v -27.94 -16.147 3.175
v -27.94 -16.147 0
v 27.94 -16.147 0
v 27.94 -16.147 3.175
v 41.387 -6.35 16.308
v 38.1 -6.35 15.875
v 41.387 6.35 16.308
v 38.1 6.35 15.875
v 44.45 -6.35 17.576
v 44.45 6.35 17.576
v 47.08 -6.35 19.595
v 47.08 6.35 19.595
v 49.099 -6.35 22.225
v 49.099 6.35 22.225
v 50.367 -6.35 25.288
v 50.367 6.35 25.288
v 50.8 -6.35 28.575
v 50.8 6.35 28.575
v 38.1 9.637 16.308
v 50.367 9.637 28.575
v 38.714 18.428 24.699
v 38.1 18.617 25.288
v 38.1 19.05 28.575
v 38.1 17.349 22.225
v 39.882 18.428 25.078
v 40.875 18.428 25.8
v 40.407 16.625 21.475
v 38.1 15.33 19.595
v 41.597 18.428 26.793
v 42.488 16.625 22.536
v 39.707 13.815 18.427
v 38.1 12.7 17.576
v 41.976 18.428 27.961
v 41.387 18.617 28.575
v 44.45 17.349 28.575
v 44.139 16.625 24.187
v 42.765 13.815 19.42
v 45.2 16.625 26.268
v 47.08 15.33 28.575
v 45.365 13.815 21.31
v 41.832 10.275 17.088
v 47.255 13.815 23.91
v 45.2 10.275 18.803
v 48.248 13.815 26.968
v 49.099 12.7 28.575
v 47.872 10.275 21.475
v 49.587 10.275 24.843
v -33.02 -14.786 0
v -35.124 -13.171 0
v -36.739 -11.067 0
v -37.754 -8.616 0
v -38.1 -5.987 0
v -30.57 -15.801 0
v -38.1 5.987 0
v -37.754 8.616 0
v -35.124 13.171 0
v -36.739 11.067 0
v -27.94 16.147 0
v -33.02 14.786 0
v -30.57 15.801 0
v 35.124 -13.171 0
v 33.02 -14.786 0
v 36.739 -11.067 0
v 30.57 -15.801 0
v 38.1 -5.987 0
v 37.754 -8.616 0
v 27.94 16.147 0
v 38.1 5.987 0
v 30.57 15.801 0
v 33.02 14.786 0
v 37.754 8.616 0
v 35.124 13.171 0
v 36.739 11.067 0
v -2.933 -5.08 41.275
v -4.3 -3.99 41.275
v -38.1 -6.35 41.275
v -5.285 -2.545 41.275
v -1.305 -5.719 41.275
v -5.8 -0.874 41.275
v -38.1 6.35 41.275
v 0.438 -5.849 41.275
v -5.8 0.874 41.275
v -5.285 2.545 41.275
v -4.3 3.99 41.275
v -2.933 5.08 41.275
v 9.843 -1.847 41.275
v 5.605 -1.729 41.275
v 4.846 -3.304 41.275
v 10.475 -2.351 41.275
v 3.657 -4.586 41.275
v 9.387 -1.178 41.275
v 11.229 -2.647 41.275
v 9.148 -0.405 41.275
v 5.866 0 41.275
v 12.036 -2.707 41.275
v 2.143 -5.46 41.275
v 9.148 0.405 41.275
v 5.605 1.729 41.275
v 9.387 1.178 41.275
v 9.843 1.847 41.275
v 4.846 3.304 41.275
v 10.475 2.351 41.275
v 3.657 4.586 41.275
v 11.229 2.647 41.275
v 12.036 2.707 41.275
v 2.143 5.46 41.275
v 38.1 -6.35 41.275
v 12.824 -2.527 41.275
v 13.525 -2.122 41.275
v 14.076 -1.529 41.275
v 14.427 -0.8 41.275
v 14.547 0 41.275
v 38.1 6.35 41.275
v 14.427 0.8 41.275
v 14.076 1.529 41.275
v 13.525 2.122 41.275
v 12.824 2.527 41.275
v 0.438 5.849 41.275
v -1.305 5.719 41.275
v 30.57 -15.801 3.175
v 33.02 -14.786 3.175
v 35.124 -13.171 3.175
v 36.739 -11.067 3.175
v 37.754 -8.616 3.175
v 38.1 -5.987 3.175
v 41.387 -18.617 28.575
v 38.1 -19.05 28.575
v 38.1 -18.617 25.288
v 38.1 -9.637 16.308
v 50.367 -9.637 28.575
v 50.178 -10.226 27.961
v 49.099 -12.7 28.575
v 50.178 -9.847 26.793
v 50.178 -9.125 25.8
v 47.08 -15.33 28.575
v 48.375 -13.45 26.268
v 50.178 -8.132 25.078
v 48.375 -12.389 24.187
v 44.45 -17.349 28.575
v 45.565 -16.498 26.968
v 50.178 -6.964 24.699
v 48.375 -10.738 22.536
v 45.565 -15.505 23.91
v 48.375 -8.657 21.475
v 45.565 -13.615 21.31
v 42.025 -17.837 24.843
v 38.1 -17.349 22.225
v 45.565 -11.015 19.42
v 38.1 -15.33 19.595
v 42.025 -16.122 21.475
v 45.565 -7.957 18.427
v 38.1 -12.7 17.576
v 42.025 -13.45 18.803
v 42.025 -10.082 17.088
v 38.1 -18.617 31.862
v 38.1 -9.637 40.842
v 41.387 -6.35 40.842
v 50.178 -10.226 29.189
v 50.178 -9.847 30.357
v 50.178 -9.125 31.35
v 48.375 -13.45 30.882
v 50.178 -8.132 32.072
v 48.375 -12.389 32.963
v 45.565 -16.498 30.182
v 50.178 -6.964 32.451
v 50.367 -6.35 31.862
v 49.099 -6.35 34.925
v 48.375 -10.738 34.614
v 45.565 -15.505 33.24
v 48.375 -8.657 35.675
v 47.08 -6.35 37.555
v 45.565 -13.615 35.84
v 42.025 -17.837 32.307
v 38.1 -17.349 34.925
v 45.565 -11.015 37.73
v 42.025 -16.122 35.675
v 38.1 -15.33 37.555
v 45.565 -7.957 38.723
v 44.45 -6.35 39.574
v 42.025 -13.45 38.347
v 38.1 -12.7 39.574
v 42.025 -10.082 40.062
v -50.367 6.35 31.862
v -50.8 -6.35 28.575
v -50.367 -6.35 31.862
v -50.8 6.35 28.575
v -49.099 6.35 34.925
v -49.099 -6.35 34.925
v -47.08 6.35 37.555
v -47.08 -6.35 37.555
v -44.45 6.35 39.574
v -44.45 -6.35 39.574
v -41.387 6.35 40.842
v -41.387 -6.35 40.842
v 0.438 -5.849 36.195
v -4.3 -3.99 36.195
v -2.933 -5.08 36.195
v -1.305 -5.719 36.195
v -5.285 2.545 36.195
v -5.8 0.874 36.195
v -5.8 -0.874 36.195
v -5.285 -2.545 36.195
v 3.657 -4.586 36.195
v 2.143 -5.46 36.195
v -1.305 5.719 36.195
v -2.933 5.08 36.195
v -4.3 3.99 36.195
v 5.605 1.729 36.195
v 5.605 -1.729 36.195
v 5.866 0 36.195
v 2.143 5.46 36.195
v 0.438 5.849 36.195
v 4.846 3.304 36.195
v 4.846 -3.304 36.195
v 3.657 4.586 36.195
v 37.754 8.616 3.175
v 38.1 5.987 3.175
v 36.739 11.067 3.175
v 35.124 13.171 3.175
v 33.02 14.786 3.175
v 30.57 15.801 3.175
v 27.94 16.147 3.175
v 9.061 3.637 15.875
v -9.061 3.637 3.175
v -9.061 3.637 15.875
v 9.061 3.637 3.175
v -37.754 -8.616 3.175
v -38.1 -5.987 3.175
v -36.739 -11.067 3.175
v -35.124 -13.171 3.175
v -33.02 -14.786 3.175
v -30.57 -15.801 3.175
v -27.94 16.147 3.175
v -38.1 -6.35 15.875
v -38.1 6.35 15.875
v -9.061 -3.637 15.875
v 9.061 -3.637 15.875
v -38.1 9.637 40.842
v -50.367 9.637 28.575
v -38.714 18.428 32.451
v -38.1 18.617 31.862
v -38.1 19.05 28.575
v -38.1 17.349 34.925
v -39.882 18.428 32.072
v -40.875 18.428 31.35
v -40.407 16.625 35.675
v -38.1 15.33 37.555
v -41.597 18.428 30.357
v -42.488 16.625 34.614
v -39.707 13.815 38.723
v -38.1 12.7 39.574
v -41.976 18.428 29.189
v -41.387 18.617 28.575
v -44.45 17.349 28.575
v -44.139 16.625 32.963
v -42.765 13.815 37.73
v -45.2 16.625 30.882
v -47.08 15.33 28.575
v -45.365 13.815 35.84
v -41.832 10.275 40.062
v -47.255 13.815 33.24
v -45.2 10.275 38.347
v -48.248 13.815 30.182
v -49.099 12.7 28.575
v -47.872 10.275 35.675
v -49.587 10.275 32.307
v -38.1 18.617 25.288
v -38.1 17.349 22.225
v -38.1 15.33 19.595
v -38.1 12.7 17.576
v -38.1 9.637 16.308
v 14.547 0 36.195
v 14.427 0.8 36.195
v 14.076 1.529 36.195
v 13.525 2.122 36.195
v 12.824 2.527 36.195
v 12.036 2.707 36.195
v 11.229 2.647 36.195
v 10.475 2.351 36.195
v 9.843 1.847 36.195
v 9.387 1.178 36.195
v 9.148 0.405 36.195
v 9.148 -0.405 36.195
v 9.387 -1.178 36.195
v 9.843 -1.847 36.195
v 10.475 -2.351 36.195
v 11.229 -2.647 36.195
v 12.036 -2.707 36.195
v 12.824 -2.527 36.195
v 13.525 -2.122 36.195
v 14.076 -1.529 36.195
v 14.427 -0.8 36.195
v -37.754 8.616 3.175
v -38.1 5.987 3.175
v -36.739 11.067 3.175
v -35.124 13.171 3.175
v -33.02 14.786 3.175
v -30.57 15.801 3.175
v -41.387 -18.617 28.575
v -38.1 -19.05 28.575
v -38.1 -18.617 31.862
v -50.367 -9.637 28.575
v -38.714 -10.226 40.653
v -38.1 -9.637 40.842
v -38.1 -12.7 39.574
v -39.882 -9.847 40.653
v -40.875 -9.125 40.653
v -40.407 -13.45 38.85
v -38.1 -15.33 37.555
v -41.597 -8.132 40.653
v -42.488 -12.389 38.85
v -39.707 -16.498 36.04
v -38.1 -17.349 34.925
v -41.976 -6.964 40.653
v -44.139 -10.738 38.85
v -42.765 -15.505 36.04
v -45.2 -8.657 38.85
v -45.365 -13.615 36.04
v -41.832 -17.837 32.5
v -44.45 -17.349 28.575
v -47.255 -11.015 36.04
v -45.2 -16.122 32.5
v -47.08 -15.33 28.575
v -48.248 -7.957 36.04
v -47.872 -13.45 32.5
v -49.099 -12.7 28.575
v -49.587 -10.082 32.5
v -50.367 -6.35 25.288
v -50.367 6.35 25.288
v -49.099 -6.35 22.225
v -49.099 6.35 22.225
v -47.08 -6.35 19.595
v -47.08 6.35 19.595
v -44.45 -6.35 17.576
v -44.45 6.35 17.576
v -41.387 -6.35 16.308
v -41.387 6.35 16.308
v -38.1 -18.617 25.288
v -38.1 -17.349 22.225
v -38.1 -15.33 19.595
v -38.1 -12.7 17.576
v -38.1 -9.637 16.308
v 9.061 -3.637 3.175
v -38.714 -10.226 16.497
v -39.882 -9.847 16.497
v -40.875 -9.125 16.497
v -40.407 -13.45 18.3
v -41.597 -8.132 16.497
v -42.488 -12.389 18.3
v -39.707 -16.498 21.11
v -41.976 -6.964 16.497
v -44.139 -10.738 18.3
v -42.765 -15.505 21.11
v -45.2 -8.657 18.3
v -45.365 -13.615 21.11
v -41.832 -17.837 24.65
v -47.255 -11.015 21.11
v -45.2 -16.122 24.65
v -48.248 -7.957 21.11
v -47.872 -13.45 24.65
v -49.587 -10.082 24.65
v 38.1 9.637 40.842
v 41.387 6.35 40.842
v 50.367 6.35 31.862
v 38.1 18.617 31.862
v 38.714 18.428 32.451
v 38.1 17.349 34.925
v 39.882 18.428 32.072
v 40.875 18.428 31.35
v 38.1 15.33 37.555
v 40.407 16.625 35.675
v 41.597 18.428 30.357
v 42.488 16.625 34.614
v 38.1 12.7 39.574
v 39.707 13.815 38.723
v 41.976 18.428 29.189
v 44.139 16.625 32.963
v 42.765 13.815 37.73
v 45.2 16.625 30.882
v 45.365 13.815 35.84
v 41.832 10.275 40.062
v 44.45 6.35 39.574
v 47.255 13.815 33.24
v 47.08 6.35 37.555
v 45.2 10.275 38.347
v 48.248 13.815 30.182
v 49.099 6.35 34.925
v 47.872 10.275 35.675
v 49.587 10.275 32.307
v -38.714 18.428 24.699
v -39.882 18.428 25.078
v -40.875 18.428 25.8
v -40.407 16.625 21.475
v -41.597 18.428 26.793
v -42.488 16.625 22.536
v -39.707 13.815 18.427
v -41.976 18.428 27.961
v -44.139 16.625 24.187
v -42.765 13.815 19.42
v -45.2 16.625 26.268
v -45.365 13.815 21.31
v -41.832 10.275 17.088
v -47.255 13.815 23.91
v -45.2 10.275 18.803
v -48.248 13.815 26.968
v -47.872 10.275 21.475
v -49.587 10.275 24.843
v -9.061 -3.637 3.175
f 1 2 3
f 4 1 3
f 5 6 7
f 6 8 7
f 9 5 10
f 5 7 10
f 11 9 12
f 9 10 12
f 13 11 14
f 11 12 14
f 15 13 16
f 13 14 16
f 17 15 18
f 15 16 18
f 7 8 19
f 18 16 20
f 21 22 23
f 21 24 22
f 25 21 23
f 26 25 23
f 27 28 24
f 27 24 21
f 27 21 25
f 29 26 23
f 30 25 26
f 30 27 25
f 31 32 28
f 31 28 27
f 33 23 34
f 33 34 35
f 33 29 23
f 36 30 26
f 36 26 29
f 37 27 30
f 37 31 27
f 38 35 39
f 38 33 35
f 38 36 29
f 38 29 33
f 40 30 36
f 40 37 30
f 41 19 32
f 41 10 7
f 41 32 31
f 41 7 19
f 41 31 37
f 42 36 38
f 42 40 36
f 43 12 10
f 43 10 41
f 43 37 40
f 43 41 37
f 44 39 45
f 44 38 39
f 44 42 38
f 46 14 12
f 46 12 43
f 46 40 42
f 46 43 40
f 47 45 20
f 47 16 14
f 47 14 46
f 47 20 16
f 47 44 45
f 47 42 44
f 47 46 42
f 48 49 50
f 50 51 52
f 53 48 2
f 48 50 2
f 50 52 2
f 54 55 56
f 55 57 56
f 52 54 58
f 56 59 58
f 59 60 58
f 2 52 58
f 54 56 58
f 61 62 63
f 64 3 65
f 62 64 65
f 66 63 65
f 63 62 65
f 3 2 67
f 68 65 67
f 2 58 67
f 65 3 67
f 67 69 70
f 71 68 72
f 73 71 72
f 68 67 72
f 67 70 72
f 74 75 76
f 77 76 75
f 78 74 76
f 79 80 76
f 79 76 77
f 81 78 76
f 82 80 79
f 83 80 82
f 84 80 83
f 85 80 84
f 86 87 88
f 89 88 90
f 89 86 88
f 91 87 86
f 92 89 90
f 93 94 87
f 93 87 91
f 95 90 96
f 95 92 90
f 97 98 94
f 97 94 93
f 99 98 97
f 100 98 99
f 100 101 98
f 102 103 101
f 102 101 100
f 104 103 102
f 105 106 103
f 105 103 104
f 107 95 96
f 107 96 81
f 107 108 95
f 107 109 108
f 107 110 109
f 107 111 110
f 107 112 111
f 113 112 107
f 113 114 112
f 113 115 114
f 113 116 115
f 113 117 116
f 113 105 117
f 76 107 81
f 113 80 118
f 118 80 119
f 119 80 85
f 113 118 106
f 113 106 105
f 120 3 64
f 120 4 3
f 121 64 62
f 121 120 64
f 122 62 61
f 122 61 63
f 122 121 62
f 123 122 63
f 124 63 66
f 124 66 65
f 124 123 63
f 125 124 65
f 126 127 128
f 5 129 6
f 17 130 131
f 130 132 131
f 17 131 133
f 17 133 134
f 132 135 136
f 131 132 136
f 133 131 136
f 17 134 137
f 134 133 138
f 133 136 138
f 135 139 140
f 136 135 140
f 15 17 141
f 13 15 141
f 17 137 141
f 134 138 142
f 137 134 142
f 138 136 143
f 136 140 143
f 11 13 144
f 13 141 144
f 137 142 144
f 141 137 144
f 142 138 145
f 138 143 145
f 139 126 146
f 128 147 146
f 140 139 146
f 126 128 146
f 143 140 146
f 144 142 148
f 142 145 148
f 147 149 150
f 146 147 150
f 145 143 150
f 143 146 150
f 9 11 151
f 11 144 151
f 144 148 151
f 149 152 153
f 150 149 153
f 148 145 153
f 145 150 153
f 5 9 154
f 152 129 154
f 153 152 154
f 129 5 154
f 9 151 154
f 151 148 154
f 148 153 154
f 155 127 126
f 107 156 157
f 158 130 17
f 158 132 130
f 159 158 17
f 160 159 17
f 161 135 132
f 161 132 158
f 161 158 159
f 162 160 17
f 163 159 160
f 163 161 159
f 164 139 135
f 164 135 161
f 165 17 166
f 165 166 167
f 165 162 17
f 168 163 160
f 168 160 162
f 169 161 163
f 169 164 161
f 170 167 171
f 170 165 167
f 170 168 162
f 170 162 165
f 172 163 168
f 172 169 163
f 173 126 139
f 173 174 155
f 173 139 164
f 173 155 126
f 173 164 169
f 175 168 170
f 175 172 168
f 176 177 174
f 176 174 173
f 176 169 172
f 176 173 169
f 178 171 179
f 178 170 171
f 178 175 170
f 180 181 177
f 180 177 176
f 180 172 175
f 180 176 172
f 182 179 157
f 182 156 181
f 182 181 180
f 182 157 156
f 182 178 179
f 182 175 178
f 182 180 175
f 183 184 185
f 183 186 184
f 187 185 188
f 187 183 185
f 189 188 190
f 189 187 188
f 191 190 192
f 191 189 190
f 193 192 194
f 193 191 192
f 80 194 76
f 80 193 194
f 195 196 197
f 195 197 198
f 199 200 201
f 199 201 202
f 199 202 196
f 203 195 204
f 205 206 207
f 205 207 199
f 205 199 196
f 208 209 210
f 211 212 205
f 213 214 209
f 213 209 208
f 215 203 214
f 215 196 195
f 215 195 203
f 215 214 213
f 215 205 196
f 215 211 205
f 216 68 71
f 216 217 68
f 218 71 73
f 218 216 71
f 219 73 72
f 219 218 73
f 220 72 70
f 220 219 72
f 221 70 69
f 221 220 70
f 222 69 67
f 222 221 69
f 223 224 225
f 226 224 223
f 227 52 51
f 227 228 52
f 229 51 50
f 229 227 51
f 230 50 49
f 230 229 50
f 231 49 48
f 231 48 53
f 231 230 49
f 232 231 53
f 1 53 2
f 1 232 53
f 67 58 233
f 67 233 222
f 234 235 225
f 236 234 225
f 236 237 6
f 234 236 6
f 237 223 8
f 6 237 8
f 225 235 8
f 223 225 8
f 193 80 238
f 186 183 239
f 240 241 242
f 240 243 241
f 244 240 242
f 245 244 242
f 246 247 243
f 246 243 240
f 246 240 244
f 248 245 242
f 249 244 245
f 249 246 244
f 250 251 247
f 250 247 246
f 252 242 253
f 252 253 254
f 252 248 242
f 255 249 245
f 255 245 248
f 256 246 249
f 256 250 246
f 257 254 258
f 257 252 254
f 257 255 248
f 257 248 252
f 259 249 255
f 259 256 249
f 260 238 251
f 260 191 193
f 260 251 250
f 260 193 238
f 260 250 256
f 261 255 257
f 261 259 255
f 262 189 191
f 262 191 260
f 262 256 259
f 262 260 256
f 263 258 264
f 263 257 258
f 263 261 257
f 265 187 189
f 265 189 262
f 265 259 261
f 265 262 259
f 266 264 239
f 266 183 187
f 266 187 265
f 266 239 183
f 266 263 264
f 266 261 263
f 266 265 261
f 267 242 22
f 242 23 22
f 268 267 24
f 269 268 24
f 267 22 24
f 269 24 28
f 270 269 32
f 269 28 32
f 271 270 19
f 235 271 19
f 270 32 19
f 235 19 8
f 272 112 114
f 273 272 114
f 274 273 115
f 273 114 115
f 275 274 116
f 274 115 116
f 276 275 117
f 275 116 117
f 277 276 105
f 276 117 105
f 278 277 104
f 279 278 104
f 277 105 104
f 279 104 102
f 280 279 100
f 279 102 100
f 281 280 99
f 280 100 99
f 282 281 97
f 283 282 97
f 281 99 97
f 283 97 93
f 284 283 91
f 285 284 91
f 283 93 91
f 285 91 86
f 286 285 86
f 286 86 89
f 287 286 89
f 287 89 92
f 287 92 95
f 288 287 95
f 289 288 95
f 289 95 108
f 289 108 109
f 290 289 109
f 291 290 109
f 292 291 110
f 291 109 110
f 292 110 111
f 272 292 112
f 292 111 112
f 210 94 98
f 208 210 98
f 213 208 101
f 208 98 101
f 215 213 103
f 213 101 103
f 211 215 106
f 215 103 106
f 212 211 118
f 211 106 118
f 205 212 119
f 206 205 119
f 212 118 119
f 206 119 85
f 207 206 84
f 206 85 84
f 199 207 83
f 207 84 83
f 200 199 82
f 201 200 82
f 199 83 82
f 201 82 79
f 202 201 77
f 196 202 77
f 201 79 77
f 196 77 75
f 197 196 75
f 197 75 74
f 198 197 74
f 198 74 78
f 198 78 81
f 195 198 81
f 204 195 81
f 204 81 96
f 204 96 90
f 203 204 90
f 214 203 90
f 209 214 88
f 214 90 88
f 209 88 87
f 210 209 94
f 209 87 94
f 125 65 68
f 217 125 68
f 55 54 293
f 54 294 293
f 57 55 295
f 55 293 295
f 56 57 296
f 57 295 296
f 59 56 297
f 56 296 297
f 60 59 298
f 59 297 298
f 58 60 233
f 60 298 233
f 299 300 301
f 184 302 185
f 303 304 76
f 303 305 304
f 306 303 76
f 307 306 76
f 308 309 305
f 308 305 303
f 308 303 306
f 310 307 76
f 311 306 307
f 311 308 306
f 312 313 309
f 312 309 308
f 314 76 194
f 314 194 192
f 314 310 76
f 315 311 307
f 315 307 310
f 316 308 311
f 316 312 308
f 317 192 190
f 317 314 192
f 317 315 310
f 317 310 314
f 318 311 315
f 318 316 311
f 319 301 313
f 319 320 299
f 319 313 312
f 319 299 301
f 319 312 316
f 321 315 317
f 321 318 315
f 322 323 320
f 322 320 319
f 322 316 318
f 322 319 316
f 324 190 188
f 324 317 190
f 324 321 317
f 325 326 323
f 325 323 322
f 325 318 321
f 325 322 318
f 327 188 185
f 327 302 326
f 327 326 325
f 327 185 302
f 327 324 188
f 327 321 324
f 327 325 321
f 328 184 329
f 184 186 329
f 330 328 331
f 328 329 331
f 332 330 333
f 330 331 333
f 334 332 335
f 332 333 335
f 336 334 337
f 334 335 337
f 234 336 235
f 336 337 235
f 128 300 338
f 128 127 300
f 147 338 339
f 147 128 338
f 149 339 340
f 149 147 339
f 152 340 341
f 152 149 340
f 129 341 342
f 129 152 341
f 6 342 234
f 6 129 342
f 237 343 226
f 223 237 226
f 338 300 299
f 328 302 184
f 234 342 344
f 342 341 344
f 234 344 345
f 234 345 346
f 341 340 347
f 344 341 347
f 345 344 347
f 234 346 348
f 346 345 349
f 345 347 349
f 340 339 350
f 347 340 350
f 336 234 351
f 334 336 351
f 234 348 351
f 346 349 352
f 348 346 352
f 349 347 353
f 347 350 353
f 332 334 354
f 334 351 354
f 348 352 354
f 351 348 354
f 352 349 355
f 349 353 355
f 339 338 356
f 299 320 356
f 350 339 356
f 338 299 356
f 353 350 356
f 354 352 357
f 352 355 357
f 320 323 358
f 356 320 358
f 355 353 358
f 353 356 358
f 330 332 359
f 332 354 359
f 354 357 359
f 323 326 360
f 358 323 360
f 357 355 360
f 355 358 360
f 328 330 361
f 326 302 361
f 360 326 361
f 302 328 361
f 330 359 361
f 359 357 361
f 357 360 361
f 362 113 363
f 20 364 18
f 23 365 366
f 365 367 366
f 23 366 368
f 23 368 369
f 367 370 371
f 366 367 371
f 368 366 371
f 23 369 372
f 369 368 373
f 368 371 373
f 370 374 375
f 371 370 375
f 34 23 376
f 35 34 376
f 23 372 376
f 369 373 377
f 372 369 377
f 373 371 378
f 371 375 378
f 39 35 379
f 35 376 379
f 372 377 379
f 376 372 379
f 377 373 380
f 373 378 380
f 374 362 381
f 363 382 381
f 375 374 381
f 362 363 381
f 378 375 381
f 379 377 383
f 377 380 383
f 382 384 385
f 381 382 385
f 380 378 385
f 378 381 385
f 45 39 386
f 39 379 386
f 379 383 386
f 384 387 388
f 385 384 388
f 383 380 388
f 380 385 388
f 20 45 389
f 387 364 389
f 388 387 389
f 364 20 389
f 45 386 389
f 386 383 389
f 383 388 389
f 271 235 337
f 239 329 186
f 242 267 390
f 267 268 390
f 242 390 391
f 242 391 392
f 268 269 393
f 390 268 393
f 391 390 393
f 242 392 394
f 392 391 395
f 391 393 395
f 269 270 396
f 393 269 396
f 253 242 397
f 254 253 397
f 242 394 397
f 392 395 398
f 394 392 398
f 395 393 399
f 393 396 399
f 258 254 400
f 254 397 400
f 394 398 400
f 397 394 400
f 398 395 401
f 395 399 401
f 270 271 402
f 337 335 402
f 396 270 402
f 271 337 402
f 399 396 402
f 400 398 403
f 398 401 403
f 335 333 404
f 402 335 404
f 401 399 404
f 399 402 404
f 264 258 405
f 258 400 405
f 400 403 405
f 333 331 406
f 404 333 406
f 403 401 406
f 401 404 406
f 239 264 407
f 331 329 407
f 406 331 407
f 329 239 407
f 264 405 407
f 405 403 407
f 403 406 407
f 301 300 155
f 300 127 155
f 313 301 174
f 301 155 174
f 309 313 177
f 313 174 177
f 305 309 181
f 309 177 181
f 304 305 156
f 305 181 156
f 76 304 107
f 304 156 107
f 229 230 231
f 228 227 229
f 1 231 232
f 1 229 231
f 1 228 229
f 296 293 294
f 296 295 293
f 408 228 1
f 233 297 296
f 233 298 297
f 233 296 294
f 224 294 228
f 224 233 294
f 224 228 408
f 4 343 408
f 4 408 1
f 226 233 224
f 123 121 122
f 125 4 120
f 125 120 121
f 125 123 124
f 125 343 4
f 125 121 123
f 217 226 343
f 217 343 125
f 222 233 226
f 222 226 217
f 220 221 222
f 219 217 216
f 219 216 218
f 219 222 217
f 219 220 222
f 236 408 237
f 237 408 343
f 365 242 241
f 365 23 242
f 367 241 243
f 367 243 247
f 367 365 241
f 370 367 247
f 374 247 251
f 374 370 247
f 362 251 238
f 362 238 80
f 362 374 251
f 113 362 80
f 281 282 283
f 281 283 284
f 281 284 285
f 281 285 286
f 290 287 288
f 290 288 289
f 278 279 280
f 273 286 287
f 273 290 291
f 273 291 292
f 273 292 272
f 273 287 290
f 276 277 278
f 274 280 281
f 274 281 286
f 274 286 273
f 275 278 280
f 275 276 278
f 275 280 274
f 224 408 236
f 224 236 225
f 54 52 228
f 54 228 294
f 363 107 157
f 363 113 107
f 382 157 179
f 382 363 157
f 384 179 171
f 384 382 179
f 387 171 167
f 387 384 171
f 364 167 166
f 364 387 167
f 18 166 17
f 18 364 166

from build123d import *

# Parameters (mm, degrees)
F0_W     = 76.2
F0_H     = 32.2935292425
F1_DEPTH = 3.175
F2_R     = 10.16
F3_W     = 18.1224476546
F3_H     = 7.2736367583
F4_DEPTH = 12.7
F5_W     = 101.6
F5_H     = 38.1
F5_W_2   = 18.1224476546
F5_H_2   = 7.2736367583
F6_DEPTH = 25.4
F7_R     = 12.69999
F8_R     = 5.8655823146
F8_R_2   = 2.7147756384
F9_DEPTH = 5.08


# Not quite as in the source:
# - a fillet or chamfer is up to 0.001 mm smaller than in the source, because OpenCascade refuses the exact size


with BuildPart() as f1:
    # F0 (on Top) → F1 (new body)
    with BuildSketch(Plane.XY):
        Rectangle(F0_W, F0_H)
    extrude(amount=F1_DEPTH)

    # F2
    f2_edges = [f1.edges().sort_by_distance(p)[0] for p in [
        (-38.1, -16.146765, 1.5875),
        (38.1, -16.146765, 1.5875),
        (38.1, 16.146765, 1.5875),
        (-38.1, 16.146765, 1.5875),
    ]]
    fillet(f2_edges, radius=F2_R)

    # F3 (on face) → F4 (join)
    with BuildSketch(Plane.XY.offset(3.175)):
        Rectangle(F3_W, F3_H)
    extrude(amount=F4_DEPTH)

    # F5 (on face) → F6 (join)
    with BuildSketch(Plane.XY.offset(15.875)):
        Rectangle(F5_W, F5_H)
        Rectangle(F5_W_2, F5_H_2, mode=Mode.SUBTRACT)
        Rectangle(F5_W_2, F5_H_2)
    extrude(amount=F6_DEPTH)

    # F7 (radius 12.7 in the source; OpenCascade refuses exactly that, so slightly less here)
    f7_edges = [f1.edges().sort_by_distance(p)[0] for p in [
        (-50.8, -19.05, 28.575),
        (0, -19.05, 41.275),
        (0, -19.05, 15.875),
        (50.8, -19.05, 28.575),
        (50.8, 0, 41.275),
        (50.8, 0, 15.875),
        (-50.8, 0, 41.275),
        (-50.8, 0, 15.875),
        (0, 19.05, 15.875),
        (0, 19.05, 41.275),
        (50.8, 19.05, 28.575),
        (-50.8, 19.05, 28.575),
    ]]
    fillet(f7_edges, radius=F7_R)

    # F8 (on face) → F9 (cut)
    with BuildSketch(Plane.XY.offset(41.275)):
        Circle(F8_R)
        with Locations((11.8326274678, 0)):
            Circle(F8_R_2)
    extrude(amount=-F9_DEPTH, mode=Mode.SUBTRACT)


solid = f1.part
